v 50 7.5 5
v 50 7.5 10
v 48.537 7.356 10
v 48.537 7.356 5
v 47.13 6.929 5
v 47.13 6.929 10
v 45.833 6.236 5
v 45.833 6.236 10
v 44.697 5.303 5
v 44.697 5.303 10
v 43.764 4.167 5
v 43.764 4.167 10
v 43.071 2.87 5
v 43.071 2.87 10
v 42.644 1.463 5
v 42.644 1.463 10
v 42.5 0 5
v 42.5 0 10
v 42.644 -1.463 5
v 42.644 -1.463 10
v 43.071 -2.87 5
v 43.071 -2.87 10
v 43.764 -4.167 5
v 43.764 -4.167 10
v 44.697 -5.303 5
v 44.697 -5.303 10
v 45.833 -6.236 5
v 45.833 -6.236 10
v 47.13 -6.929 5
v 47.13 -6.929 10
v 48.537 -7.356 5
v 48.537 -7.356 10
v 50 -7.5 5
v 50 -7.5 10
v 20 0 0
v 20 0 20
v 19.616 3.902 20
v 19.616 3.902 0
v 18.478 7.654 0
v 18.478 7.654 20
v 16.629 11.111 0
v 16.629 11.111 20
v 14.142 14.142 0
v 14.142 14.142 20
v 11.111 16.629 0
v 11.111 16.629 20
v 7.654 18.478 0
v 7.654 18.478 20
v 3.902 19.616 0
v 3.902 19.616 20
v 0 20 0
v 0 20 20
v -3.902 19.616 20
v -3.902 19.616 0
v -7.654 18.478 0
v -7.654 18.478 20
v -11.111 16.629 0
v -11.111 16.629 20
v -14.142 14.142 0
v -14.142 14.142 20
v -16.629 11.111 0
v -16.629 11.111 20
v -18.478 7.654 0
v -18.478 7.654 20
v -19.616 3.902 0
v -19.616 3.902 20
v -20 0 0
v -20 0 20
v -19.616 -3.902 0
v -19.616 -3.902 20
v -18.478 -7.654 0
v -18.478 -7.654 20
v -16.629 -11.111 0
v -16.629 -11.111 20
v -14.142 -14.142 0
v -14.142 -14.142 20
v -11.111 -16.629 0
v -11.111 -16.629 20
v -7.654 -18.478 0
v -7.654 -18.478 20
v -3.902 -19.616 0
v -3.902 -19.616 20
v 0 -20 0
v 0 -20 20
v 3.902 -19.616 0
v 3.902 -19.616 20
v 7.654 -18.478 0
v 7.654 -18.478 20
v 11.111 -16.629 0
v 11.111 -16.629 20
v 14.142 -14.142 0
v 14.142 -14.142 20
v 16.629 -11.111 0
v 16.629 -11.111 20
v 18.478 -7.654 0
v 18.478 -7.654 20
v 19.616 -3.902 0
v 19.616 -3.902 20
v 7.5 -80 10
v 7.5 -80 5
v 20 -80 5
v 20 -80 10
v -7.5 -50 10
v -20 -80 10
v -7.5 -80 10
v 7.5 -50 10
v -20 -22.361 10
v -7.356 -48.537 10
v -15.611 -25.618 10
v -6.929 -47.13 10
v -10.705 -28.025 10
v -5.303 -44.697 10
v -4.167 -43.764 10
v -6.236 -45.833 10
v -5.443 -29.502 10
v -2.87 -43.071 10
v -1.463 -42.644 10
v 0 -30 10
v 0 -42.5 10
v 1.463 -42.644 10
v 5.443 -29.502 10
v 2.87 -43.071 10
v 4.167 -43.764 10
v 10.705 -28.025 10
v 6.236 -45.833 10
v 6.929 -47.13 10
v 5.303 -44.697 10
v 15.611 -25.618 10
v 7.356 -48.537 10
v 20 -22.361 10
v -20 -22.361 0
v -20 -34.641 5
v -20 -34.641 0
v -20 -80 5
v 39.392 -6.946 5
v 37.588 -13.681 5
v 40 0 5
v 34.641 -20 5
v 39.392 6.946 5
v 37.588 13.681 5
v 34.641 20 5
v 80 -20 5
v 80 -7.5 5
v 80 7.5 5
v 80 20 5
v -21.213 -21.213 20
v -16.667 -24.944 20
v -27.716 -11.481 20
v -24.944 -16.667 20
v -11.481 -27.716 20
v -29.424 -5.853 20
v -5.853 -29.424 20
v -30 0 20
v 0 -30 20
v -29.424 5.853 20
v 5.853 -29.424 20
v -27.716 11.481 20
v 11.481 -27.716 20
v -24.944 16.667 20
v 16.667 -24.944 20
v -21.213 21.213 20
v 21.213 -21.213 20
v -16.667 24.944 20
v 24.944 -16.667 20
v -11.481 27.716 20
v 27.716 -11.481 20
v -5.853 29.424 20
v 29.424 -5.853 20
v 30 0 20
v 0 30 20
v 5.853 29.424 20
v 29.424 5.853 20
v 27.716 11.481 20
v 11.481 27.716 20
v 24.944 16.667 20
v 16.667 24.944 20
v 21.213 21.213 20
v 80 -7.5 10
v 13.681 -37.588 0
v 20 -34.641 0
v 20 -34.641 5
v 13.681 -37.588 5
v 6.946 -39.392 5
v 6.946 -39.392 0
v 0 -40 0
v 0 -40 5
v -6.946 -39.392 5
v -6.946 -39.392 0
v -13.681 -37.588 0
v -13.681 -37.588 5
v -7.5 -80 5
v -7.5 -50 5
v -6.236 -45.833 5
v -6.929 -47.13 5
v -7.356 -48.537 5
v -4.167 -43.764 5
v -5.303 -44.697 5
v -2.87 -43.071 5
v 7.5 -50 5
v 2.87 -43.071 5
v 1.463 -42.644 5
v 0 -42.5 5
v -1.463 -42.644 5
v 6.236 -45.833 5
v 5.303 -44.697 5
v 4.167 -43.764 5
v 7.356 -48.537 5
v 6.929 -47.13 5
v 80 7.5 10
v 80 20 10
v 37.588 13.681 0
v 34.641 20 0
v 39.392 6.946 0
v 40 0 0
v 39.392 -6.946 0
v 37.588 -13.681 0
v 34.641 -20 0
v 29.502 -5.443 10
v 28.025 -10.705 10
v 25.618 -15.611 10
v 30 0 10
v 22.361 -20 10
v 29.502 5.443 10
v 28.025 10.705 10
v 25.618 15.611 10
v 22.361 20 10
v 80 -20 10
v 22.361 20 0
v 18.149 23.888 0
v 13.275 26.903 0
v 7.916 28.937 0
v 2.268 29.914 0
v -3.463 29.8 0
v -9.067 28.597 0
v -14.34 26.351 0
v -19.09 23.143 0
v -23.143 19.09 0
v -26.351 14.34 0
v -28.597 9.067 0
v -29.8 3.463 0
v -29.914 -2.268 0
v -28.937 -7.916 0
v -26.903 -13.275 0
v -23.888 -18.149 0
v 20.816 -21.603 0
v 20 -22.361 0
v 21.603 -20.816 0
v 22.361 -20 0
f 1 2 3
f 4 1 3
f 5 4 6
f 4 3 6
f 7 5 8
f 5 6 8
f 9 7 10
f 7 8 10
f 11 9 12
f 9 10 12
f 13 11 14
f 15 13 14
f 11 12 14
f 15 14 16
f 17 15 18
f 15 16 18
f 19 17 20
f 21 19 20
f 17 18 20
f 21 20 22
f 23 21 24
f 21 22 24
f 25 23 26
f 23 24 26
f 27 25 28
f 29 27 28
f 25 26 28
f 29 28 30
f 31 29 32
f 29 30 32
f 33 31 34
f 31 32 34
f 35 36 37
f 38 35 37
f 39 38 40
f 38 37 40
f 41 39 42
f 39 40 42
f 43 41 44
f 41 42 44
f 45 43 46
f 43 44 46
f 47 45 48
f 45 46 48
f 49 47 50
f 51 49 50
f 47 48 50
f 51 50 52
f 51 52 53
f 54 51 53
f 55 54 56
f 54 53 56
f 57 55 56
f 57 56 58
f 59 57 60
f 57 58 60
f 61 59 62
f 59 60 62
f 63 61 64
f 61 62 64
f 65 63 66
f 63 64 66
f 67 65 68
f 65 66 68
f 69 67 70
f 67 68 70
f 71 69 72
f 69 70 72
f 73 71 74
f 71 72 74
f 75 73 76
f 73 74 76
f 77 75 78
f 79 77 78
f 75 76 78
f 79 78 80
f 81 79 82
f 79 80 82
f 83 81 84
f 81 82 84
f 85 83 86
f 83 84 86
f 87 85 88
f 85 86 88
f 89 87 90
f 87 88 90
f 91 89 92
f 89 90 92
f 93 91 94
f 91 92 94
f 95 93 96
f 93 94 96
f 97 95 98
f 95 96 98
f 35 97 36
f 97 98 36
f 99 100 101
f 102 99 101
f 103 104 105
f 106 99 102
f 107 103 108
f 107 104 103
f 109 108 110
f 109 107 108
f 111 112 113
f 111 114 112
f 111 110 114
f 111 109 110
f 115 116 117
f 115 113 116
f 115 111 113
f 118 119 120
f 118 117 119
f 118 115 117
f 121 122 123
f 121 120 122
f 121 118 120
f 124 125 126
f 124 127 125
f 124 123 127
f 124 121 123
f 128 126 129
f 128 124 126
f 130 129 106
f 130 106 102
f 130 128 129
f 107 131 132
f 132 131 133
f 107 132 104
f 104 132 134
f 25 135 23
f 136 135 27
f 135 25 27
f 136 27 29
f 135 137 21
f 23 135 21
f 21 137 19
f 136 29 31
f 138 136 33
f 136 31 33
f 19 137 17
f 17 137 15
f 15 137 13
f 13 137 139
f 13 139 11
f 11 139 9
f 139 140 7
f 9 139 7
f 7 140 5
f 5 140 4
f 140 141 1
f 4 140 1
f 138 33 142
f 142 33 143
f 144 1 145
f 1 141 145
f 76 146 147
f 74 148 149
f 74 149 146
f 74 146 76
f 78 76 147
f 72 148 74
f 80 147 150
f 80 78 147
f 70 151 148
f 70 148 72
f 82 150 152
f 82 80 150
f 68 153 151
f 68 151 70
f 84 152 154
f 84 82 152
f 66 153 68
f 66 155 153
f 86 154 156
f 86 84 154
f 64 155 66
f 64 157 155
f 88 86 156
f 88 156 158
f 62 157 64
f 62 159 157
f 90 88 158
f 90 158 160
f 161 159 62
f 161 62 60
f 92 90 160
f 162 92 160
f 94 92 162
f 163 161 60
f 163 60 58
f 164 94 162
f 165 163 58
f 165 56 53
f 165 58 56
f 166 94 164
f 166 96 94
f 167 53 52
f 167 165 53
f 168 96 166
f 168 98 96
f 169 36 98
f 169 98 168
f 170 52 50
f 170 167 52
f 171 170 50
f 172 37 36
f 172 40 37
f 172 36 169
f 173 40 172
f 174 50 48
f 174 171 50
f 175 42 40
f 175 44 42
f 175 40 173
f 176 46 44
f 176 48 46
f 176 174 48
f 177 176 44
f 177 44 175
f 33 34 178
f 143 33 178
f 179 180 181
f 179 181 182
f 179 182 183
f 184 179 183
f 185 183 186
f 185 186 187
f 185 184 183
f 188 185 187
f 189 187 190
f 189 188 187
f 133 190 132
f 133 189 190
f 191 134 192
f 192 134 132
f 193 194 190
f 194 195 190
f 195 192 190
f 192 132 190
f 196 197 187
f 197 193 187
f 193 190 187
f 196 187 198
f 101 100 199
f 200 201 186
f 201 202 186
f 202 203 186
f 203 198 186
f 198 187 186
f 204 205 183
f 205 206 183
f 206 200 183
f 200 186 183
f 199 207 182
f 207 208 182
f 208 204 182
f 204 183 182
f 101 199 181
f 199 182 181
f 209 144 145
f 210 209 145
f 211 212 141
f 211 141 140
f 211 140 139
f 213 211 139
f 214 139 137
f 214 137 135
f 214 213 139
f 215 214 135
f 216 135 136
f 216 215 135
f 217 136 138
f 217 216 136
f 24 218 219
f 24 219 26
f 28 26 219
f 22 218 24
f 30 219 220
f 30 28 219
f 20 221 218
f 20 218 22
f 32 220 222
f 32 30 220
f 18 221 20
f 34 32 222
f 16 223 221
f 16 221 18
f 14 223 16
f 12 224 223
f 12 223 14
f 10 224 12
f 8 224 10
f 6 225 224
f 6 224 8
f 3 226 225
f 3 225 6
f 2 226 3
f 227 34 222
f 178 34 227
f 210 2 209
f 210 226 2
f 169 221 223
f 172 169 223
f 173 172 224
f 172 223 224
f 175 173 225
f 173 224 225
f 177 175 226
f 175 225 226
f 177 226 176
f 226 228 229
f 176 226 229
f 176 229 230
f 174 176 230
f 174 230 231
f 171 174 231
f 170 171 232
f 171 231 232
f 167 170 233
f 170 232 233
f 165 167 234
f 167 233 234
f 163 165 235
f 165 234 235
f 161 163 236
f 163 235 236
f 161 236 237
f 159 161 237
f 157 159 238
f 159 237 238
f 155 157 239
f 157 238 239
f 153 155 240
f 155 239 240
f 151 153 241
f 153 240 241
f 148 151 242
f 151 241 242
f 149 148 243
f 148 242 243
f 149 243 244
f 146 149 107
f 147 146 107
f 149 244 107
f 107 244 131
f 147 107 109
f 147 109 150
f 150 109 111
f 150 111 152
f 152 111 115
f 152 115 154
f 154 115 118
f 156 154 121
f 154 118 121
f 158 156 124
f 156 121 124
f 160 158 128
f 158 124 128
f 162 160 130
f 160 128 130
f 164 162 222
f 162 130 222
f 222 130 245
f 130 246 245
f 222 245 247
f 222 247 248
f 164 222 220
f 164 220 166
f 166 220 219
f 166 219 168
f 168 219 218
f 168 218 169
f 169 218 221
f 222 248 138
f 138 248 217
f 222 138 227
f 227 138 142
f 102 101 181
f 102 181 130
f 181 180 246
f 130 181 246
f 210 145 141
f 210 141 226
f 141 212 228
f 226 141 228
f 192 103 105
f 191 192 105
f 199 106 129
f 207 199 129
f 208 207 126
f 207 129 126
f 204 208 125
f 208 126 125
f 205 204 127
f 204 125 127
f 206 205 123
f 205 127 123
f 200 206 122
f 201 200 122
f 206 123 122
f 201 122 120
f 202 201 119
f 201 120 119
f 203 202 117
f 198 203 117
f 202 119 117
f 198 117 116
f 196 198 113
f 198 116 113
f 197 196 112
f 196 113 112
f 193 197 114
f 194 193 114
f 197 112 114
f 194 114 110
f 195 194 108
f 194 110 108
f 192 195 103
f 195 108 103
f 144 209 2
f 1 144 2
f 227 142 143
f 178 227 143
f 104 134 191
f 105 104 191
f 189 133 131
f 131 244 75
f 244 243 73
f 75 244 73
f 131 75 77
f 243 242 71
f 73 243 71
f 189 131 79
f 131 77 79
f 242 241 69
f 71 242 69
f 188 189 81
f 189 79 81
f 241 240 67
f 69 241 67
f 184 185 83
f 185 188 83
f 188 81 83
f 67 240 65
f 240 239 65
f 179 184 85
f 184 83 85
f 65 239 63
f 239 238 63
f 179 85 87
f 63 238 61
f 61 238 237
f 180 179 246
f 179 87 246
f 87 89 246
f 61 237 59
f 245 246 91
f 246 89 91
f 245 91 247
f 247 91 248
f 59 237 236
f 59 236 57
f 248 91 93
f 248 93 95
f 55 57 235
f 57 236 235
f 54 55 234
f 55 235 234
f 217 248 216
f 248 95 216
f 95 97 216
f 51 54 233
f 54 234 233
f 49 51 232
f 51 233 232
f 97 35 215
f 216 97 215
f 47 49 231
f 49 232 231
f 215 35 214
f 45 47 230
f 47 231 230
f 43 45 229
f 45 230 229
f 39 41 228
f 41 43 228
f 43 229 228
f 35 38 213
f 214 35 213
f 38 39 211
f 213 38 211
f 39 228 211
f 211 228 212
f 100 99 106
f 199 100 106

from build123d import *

# Parameters (mm, degrees)
F0_R      = 30
F1_DEPTH  = 20
F3_DEPTH  = 10
F5_DEPTH  = 25
F7_DEPTH  = 10
F9_DEPTH  = 5
F10_R     = 20
F11_DEPTH = 20


with BuildPart() as f1:
    # F0 (on Top) → F1 (new body)
    with BuildSketch(Plane.XY):
        Circle(F0_R)
    extrude(amount=F1_DEPTH)

    # F2 (on Top) → F3 (join)
    with BuildSketch(Plane.XY):
        with BuildLine():
            ThreePointArc((22.36068, 20), (30, 0), (22.36068, -20))
            Line((22.36068, -20), (80, -20))
            Line((80, -20), (80, 20))
            Line((80, 20), (22.36068, 20))
        make_face()
        with BuildLine():
            Line((20, -80), (20, -22.36068))
            ThreePointArc((20, -22.36068), (0, -30), (-20, -22.36068))
            Line((-20, -22.36068), (-20, -80))
            Line((-20, -80), (20, -80))
        make_face()
    extrude(amount=F3_DEPTH)

    # F4 (on face) → F5 (cut)
    with BuildSketch(Plane.XY.offset(10)):
        with BuildLine():
            Line((7.5, -80), (7.5, -50))
            ThreePointArc((7.5, -50), (0, -42.5), (-7.5, -50))
            Line((-7.5, -50), (-7.5, -80))
            Line((-7.5, -80), (7.5, -80))
        make_face()
    extrude(amount=-F5_DEPTH, mode=Mode.SUBTRACT)

    # F6 (on face) → F7 (cut)
    with BuildSketch(Plane.XY.offset(10)):
        with BuildLine():
            Line((80, 7.5), (50, 7.5))
            ThreePointArc((50, 7.5), (42.5, 0), (50, -7.5))
            Line((50, -7.5), (80, -7.5))
            Line((80, -7.5), (80, 7.5))
        make_face()
    extrude(amount=-F7_DEPTH, mode=Mode.SUBTRACT)

    # F8 (on Top) → F9 (cut)
    with BuildSketch(Plane.XY):
        with BuildLine():
            ThreePointArc((20, -34.641016), (0, -40), (-20, -34.641016))
            Line((-20, -34.641016), (-20, -80))
            Line((-20, -80), (20, -80))
            Line((20, -80), (20, -34.641016))
        make_face()
        with BuildLine():
            ThreePointArc((34.641016, 20), (40, 0), (34.641016, -20))
            Line((34.641016, -20), (80, -20))
            Line((80, -20), (80, 20))
            Line((80, 20), (34.641016, 20))
        make_face()
    extrude(amount=F9_DEPTH, mode=Mode.SUBTRACT)

    # F10 (on face) → F11 (cut)
    with BuildSketch(Plane.XY.offset(20)):
        Circle(F10_R)
    extrude(amount=-F11_DEPTH, mode=Mode.SUBTRACT)


solid = f1.part
